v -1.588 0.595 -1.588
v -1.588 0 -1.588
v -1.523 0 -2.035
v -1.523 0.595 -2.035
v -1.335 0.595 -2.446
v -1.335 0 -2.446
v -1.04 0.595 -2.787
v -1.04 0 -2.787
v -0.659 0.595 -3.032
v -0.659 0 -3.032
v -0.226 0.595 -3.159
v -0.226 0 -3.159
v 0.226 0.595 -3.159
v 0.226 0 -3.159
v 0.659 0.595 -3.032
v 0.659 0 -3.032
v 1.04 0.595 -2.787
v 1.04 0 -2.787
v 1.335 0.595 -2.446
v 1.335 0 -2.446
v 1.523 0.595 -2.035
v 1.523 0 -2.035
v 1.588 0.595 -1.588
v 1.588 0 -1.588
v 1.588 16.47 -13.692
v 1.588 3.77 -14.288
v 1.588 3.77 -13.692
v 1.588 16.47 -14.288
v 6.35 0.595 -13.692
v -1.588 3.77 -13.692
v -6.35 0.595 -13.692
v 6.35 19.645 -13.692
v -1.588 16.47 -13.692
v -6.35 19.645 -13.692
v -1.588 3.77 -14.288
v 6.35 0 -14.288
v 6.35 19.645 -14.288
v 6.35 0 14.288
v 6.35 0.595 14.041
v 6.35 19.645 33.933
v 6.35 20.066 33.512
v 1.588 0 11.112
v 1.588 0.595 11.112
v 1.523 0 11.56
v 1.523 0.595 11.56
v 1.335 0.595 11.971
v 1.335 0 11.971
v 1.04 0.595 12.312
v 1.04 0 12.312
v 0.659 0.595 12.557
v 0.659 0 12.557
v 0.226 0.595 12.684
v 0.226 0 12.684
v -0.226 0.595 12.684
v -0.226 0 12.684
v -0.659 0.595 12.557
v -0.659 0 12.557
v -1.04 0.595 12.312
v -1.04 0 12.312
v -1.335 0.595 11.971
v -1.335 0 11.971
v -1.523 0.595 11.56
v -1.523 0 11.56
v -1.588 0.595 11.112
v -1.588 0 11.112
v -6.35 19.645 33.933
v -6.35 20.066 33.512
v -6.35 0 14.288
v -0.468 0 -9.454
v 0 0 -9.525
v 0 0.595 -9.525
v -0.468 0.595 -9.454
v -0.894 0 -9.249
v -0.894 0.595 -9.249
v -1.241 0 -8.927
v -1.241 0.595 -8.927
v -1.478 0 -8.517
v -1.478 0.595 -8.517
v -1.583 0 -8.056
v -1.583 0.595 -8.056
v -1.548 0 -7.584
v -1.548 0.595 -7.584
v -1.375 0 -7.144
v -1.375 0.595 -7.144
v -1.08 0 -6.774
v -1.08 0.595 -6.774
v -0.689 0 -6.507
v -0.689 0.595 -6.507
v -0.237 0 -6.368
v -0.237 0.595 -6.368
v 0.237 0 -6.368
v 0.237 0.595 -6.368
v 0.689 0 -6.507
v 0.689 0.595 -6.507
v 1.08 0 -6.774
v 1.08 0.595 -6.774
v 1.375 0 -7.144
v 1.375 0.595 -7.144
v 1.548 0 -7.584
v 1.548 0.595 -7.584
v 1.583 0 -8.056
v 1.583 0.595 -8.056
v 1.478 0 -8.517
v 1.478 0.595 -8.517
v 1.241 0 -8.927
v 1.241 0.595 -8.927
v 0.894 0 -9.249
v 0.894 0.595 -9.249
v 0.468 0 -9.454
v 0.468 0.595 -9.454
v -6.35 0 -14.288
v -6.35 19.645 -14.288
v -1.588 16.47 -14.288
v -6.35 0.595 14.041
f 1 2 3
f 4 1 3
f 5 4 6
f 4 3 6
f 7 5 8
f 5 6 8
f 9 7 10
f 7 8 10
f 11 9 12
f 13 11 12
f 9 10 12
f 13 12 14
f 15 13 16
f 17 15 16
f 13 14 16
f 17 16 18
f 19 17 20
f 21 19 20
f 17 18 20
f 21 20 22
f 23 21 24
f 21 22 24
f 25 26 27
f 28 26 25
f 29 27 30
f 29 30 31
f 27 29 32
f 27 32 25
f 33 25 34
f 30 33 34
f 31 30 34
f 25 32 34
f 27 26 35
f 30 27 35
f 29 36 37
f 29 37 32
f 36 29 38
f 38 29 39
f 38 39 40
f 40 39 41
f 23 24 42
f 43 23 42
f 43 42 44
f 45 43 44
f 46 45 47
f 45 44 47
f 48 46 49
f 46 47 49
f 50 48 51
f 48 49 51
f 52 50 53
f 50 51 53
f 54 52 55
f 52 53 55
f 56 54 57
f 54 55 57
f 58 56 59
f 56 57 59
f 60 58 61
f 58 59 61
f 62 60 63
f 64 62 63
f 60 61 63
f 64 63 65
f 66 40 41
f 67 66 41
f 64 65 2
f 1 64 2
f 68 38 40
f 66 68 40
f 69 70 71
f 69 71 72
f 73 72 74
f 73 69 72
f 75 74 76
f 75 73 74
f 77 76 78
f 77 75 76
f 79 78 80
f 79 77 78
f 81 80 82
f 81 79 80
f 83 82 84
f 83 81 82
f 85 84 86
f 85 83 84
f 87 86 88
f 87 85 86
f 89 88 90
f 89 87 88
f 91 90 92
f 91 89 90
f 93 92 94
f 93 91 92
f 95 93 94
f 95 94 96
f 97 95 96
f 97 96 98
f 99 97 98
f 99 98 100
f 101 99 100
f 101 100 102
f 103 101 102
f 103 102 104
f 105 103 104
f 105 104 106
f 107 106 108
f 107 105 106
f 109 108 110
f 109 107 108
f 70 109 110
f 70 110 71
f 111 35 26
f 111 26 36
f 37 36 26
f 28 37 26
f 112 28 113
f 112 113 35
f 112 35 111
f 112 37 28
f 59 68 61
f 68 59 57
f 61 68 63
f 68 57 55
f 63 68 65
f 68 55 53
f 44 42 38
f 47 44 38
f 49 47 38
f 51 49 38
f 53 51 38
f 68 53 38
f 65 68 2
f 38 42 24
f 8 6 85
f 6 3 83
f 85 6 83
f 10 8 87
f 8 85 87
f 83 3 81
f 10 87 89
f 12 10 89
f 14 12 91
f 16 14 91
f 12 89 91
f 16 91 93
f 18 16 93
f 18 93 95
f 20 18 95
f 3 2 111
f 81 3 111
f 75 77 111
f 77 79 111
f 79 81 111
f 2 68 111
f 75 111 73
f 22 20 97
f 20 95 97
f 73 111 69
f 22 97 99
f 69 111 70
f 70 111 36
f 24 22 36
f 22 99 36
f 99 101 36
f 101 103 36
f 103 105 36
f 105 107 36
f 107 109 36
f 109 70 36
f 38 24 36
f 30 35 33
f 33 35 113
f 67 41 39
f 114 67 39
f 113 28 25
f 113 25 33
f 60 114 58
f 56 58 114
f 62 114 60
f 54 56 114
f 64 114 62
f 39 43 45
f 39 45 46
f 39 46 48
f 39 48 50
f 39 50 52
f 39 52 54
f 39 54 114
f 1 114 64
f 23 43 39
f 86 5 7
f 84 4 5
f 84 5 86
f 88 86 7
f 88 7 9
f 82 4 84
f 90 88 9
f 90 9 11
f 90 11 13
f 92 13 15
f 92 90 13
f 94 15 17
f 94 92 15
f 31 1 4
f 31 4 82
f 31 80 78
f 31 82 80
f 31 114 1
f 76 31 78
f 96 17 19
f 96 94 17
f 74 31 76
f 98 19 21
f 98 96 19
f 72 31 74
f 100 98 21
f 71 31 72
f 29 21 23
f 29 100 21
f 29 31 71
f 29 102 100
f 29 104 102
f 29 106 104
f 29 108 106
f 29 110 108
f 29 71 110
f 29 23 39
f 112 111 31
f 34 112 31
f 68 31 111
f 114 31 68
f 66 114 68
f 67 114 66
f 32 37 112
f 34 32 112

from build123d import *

# Parameters (mm, degrees)
SKETCH1_W           = 12.7
SKETCH1_H           = 28.575
SKETCH1_R           = 1.5875
BOSS_EXTRUDE1_DEPTH = 0.5953125
SKETCH3_W           = 12.7
SKETCH3_H           = 19.05
SKETCH3_W_2         = 3.175
SKETCH3_H_2         = 12.7
BOSS_EXTRUDE2_DEPTH = 0.5953125
BOSS_EXTRUDE3_DEPTH = 12.7


with BuildPart() as part:
    # Sketch1 → Boss-Extrude1 (new body)
    with BuildSketch(Plane(origin=(0, 0, 0), x_dir=(1, 0, 0), z_dir=(0, 1, 0))):
        Rectangle(SKETCH1_W, SKETCH1_H)
        with Locations(Location((0, 7.9375, 0), (0, 0, 90))):
            Circle(SKETCH1_R, mode=Mode.SUBTRACT)
        with BuildLine():
            Line((1.5875, 1.5875), (1.5875, -11.1125))
            ThreePointArc((1.5875, -11.1125), (0, -12.7), (-1.5875, -11.1125))
            Line((-1.5875, -11.1125), (-1.5875, 1.5875))
            ThreePointArc((-1.5875, 1.5875), (0, 3.175), (1.5875, 1.5875))
        make_face(mode=Mode.SUBTRACT)
    extrude(amount=BOSS_EXTRUDE1_DEPTH)

    # Sketch3 → Boss-Extrude2 (add)
    with BuildSketch(Plane(origin=(0, 0, -14.2875), x_dir=(-1, 0, 0), z_dir=(0, 0, -1))):
        with Locations((0, 10.1203125)):
            Rectangle(SKETCH3_W, SKETCH3_H)
        with Locations((0, 10.1203125)):
            Rectangle(SKETCH3_W_2, SKETCH3_H_2, mode=Mode.SUBTRACT)
    extrude(amount=-BOSS_EXTRUDE2_DEPTH)

    # Sketch4 → Boss-Extrude3 (add)
    with BuildSketch(Plane(origin=(6.35, 0, 0), x_dir=(0, 0, -1), z_dir=(1, 0, 0))):
        Polygon((-14.2875, 0), (-33.9328125, 19.6453125), (-33.511862994, 20.066262006), (-14.040913489, 0.5953125), (-14.2875, 0.5953125), align=None)
    extrude(amount=-BOSS_EXTRUDE3_DEPTH)


solid = part.part
